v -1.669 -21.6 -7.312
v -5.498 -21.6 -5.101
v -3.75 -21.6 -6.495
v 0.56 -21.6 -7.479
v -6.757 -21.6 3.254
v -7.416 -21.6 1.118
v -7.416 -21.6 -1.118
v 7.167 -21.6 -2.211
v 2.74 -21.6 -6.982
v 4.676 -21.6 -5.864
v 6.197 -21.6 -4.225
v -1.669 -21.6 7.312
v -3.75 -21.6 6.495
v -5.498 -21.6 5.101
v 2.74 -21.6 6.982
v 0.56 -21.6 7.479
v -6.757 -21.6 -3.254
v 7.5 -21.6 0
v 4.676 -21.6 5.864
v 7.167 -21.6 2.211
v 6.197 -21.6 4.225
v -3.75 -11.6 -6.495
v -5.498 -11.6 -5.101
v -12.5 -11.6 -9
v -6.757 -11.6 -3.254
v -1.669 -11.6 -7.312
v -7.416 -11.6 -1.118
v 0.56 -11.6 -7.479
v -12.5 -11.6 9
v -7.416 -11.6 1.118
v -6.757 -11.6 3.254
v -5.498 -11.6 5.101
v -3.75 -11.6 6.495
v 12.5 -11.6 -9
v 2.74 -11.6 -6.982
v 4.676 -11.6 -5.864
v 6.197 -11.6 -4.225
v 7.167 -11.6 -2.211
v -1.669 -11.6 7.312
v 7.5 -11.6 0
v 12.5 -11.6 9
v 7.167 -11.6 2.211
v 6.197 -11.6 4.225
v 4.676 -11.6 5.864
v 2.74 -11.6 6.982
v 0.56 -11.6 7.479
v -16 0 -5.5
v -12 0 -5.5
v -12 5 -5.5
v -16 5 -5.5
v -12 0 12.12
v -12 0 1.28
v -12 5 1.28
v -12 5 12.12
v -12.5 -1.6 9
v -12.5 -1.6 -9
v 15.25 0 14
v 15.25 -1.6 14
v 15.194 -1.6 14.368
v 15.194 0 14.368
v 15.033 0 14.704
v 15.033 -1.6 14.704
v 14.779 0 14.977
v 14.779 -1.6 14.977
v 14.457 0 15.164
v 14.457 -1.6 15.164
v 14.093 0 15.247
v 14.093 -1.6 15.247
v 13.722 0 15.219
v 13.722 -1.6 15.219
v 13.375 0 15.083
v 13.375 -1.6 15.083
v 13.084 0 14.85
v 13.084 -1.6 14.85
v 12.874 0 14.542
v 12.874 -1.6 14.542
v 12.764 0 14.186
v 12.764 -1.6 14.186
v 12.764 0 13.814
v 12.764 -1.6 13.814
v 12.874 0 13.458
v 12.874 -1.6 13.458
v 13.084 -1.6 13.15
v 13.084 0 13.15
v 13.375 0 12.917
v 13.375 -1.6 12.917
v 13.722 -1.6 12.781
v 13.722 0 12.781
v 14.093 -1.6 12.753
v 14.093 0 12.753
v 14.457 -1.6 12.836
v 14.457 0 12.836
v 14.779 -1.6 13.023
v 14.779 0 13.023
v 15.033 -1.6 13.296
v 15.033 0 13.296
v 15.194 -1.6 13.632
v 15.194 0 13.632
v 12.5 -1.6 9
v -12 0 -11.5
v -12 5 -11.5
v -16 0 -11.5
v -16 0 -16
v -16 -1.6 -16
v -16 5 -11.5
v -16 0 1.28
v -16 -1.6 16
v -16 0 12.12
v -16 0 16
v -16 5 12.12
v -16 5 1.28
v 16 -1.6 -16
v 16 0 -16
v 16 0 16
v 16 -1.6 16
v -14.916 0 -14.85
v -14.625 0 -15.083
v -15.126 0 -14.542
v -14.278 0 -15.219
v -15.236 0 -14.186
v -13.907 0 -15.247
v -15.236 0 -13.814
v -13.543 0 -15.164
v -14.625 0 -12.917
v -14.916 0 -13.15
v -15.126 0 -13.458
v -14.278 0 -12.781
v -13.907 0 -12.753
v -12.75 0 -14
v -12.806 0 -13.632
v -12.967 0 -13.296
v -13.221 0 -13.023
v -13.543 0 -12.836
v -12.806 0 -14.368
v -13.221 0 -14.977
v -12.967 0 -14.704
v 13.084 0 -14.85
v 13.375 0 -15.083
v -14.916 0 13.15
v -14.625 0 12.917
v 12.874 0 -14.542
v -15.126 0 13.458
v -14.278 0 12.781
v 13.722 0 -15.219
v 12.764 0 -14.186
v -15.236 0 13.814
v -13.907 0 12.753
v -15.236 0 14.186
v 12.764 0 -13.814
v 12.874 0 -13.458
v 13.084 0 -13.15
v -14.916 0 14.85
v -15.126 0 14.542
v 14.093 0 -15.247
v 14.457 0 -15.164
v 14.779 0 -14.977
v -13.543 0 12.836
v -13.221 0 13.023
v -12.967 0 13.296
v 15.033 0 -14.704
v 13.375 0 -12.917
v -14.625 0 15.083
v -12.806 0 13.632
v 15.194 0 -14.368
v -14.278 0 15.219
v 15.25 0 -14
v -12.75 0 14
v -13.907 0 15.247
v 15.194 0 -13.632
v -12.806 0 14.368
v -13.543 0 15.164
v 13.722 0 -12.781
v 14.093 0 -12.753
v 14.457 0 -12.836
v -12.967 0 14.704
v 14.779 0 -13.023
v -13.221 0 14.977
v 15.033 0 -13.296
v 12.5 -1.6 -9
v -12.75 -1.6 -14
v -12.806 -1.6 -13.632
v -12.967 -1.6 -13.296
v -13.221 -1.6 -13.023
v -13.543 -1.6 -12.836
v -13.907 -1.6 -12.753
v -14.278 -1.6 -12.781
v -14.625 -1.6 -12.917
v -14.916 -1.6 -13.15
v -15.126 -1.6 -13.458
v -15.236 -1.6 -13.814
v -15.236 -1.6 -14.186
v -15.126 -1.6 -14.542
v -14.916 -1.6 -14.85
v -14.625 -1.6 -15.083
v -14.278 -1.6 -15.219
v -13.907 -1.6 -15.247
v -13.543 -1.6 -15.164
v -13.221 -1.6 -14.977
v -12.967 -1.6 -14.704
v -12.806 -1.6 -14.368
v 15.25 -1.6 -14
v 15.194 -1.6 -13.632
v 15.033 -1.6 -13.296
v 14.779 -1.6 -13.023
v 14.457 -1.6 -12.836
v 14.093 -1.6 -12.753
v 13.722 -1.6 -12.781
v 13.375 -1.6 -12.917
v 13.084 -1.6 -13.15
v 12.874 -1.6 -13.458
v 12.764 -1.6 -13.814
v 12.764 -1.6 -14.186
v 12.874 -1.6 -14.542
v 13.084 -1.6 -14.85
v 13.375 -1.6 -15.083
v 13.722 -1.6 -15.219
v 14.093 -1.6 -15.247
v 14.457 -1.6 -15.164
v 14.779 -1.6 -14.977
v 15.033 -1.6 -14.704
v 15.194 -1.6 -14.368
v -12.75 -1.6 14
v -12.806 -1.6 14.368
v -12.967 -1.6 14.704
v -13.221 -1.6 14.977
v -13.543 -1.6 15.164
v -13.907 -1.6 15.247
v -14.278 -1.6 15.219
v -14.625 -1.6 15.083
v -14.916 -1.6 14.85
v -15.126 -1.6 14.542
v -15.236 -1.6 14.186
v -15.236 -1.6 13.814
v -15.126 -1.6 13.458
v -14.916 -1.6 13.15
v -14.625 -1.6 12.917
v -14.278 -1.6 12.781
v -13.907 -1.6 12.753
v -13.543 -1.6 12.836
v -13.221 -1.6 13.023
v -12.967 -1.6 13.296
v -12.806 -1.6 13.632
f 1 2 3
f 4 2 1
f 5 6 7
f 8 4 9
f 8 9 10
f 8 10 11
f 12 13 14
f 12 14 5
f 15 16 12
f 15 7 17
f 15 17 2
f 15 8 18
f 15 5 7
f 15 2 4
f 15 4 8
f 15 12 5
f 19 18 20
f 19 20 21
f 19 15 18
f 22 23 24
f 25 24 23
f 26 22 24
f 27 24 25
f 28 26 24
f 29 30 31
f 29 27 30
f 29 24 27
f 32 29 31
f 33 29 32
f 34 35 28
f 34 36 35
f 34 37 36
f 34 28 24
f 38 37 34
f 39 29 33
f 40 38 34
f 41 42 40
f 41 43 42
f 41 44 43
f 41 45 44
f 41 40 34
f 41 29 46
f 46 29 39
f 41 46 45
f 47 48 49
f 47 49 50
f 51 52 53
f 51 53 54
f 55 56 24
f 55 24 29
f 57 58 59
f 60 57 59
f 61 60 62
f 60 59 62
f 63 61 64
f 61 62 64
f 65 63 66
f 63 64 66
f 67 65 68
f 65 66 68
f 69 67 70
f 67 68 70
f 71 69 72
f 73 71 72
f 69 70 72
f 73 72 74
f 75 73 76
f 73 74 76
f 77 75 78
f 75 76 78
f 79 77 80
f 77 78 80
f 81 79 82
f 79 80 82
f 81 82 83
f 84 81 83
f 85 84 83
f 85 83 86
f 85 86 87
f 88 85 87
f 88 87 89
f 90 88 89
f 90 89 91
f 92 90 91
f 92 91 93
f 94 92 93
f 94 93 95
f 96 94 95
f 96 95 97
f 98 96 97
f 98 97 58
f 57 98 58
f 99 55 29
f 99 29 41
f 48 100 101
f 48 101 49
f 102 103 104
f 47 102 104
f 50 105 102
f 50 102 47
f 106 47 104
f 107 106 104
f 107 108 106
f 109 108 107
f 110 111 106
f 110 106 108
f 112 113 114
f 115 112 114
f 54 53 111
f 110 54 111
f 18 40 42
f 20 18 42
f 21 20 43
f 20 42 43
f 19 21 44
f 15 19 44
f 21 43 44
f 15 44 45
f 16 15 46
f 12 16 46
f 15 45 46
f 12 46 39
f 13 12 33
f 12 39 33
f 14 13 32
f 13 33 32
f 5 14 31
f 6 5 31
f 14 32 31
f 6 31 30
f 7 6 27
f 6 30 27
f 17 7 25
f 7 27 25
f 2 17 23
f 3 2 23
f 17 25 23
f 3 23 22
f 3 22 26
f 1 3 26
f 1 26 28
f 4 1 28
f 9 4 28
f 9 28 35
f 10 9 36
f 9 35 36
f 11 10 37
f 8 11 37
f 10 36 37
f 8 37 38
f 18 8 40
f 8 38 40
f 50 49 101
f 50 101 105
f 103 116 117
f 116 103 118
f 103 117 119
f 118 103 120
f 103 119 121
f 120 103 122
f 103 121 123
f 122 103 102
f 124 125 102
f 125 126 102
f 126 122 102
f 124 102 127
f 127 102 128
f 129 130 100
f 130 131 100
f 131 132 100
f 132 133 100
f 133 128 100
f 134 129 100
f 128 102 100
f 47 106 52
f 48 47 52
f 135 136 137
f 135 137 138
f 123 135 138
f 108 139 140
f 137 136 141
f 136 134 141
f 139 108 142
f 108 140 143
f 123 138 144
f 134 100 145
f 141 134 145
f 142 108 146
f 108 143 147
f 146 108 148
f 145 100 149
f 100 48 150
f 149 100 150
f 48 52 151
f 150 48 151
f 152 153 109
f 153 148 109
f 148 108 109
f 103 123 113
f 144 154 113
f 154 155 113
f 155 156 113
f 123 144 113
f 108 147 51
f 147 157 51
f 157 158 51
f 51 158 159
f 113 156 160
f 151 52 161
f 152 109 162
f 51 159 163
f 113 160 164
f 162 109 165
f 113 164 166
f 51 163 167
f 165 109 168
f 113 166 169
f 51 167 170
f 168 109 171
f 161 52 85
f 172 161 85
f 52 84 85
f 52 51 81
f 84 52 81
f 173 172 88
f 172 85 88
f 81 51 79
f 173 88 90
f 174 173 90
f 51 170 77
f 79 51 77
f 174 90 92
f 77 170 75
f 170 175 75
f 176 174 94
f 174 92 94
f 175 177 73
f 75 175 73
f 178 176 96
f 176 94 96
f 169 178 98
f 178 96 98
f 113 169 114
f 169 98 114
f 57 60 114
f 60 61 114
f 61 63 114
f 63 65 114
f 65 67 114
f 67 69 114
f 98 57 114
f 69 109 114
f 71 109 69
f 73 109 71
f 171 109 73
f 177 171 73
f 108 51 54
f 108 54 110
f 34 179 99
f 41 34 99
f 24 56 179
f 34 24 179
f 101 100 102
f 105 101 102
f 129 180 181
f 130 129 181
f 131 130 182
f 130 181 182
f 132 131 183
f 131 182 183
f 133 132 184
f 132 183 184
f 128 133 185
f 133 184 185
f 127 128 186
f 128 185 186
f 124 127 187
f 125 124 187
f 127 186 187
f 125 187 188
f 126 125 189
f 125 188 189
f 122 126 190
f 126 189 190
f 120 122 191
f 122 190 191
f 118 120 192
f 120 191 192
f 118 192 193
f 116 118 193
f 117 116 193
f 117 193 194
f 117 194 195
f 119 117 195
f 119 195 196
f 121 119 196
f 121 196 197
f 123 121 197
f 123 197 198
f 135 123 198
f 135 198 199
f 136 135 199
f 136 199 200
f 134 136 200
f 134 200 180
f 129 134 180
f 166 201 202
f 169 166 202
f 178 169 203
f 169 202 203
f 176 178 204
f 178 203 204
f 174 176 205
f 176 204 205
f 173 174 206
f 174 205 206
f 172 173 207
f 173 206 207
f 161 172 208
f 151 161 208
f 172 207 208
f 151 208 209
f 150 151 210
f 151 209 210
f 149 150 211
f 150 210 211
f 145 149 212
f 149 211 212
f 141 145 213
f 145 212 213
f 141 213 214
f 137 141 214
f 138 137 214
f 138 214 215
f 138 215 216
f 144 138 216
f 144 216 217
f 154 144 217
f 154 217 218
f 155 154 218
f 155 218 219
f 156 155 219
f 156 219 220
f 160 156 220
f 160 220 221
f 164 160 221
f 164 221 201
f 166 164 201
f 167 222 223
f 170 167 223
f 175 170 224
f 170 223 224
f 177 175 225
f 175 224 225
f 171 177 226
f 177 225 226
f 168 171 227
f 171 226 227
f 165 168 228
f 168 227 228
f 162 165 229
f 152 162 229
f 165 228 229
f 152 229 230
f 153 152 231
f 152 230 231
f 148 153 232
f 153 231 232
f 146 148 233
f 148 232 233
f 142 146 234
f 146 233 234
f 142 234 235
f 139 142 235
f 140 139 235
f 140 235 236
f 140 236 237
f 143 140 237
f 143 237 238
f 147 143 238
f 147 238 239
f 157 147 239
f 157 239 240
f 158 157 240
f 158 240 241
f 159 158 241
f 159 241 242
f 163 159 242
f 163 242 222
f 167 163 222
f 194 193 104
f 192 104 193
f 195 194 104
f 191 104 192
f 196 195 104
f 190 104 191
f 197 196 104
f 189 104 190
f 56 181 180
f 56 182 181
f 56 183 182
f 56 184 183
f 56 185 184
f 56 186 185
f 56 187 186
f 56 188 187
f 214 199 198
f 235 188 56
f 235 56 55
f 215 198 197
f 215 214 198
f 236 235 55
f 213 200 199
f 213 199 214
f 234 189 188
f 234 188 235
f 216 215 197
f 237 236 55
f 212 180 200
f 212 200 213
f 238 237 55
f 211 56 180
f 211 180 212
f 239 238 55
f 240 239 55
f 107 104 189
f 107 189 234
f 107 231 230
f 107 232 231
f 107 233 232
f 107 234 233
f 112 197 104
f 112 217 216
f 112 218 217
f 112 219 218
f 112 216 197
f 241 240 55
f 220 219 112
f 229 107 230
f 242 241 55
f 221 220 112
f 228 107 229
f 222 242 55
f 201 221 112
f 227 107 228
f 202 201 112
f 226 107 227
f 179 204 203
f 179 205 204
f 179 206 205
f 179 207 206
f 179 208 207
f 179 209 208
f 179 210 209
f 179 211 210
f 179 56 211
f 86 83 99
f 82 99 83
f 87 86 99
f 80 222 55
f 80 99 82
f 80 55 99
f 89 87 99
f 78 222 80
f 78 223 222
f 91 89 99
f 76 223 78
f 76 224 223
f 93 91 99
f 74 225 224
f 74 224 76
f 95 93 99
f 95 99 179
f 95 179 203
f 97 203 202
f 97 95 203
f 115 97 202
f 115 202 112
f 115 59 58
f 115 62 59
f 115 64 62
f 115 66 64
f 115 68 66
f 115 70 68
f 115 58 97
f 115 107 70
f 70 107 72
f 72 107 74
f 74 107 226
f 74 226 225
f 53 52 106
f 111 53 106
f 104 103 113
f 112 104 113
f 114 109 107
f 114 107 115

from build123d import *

# Parameters (mm, degrees)
F0_W     = 32
F0_H     = 32
F1_DEPTH = 1.6
F2_W     = 25
F2_H     = 18
F3_DEPTH = 10
F4_R     = 7.5
F5_DEPTH = 10
F6_W     = 4
F6_H     = 10.84
F6_H_2   = 6
F7_DEPTH = 5
F8_R     = 1.25
F9_DEPTH = 25


with BuildPart() as f1:
    # F0 (on Front) → F1 (new body)
    with BuildSketch(Plane.XZ):
        Rectangle(F0_W, F0_H)
    extrude(amount=F1_DEPTH)

    # F2 (on face) → F3 (join)
    with BuildSketch(Plane.XZ.offset(1.6)):
        Rectangle(F2_W, F2_H)
    extrude(amount=F3_DEPTH)

    # F4 (on face) → F5 (join)
    with BuildSketch(Plane.XZ.offset(11.6)):
        Circle(F4_R)
    extrude(amount=F5_DEPTH)

    # F6 (on face) → F7 (join)
    with BuildSketch(Plane(origin=(0, 0, 0), x_dir=(-1, 0, 0), z_dir=(0, 1, 0))):
        with Locations((14, 6.7)):
            Rectangle(F6_W, F6_H)
        with Locations((14, -8.5)):
            Rectangle(F6_W, F6_H_2)
    extrude(amount=F7_DEPTH)

    # F8 (on face) → F9 (cut)
    with BuildSketch(Plane.XZ.offset(1.6)):
        with Locations((14, 14)):
            Circle(F8_R)
        with Locations((14, -14)):
            Circle(F8_R)
        with Locations((-14, -14)):
            Circle(F8_R)
        with Locations((-14, 14)):
            Circle(F8_R)
    extrude(amount=-F9_DEPTH, mode=Mode.SUBTRACT)


solid = f1.part
